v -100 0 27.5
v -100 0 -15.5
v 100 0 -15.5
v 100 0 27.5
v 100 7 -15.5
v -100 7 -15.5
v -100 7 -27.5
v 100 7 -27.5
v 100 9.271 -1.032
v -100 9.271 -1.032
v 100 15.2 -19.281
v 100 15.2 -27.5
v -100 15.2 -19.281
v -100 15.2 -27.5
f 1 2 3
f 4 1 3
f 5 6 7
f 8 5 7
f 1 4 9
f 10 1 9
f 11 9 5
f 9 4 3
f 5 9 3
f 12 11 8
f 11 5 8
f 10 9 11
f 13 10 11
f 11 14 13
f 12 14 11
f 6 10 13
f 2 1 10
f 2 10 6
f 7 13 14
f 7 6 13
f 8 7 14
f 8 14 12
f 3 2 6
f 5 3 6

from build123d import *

# Parameters (mm, degrees)
CROQUIS1_W                 = 200
CROQUIS1_H                 = 55
SALIENTE_EXTRUIR1_DEPTH    = 15.2
CORTAR_EXTRUIR1_DEPTH      = 203.453179773
CORTAR_EXTRUIR1_DEPTH_BACK = 203.453179773
CROQUIS2_W                 = 12
CROQUIS2_H                 = 7


with BuildPart() as part:
    # Croquis1 → Saliente-Extruir1 (new body)
    with BuildSketch(Plane(origin=(0, 0, 0), x_dir=(1, 0, 0), z_dir=(0, 1, 0))):
        Rectangle(CROQUIS1_W, CROQUIS1_H)
    extrude(amount=SALIENTE_EXTRUIR1_DEPTH)

    # Croquis2 → Cortar-Extruir1 (cut, two sides: drawn at the far end of the back side and taken through both)
    with BuildSketch(Plane(origin=(100, 0, 0), x_dir=(0, 0, -1), z_dir=(1, 0, 0)).offset(-CORTAR_EXTRUIR1_DEPTH_BACK)):
        Polygon((-27.5, 0), (1.031695489, 9.270509831), (19.280789765, 15.2), (-27.5, 15.2), align=None)
        with Locations((21.5, 3.5)):
            Rectangle(CROQUIS2_W, CROQUIS2_H)
    extrude(amount=CORTAR_EXTRUIR1_DEPTH + CORTAR_EXTRUIR1_DEPTH_BACK, mode=Mode.SUBTRACT)


solid = part.part
